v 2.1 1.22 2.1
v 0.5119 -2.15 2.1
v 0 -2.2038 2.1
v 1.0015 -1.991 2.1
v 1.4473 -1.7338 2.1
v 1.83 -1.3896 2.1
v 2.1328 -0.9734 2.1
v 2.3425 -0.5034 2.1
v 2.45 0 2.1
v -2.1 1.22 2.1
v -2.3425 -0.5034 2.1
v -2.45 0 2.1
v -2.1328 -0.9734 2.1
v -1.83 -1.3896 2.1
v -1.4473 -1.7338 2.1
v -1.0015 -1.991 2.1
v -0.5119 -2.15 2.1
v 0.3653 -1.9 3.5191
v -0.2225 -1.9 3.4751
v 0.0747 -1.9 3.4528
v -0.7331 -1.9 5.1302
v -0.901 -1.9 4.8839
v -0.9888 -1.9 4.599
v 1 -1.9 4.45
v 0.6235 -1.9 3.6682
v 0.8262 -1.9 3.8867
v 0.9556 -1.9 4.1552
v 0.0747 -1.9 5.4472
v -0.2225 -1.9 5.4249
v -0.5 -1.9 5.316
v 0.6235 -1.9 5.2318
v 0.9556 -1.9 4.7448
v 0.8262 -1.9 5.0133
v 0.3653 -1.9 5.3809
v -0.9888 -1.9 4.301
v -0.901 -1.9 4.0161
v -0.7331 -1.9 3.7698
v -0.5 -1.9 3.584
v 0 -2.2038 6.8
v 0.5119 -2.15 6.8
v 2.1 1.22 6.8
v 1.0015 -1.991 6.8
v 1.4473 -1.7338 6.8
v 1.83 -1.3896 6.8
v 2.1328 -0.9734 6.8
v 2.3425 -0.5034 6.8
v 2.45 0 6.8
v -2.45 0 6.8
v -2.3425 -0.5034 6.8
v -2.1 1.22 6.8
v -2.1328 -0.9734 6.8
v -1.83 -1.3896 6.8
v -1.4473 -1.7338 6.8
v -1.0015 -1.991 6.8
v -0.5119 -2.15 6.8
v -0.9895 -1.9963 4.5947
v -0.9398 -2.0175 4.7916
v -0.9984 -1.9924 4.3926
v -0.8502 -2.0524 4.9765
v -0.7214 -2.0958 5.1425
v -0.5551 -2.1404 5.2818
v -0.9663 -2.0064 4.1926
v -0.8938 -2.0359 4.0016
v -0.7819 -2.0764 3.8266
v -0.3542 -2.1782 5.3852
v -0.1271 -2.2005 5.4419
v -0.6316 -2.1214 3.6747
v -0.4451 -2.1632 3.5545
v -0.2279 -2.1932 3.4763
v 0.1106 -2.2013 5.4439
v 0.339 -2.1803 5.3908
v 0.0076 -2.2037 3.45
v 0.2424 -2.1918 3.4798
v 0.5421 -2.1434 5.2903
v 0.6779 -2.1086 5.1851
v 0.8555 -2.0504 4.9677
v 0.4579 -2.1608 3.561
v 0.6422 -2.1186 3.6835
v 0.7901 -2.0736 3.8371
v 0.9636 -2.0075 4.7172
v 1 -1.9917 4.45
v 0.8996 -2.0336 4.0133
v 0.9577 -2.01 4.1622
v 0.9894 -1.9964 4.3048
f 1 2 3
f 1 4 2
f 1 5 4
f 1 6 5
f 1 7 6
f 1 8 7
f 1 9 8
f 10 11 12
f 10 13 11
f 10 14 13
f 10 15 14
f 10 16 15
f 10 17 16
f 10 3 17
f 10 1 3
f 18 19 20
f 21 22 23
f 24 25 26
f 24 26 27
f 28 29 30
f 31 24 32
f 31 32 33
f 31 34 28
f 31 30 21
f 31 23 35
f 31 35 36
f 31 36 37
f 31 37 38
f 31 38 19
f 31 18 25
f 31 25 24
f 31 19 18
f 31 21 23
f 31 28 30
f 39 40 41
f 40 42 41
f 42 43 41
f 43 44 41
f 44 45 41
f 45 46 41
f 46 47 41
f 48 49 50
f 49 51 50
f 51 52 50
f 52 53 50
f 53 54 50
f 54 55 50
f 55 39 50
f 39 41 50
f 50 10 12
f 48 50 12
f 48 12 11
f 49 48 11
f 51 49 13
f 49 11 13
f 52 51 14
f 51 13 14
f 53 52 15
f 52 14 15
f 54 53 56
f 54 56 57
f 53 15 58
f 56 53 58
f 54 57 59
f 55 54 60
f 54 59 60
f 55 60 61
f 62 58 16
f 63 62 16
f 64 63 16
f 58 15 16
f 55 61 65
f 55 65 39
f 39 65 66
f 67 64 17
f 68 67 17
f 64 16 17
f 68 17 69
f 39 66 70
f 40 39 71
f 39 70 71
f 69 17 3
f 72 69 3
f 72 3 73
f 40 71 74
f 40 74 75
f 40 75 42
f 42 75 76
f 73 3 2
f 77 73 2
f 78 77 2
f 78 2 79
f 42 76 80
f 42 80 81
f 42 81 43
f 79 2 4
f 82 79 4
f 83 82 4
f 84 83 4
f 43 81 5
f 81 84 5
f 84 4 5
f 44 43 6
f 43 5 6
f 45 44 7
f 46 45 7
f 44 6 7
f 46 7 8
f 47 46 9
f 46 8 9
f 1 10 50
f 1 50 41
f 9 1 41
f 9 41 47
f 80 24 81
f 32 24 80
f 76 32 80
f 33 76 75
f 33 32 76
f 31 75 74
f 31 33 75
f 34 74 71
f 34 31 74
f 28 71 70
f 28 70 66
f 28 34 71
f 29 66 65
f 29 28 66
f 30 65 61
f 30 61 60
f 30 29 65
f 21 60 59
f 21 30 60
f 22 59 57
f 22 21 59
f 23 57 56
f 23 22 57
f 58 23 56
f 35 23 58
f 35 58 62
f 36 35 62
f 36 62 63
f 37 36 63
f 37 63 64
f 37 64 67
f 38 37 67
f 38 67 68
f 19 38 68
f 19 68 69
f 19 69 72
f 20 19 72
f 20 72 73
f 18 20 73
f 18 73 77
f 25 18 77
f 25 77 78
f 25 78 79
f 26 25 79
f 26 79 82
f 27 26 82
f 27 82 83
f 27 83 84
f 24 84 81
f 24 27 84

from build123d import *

# Parameters (mm, degrees)
CYLINDER039_R     = 1
CYLINDER039_DEPTH = 1
EXTRUDE010_DEPTH  = 4.7


with BuildPart() as cylinder039:
    # Cylinder039 → Cylinder039 (new body)
    with BuildSketch(Plane(origin=(0, -1.9, 2.35), x_dir=(1, 0, 0), z_dir=(0, -1, 0))):
        Circle(CYLINDER039_R)
    extrude(amount=CYLINDER039_DEPTH)


with BuildPart() as vt1_body:
    # Sketch027 → Extrude010 (new body)
    with BuildSketch(Plane.XY):
        with BuildLine():
            Line((-2.1, 1.22), (2.1, 1.22))
            Line((2.1, 1.22), (2.45, 0))
            ThreePointArc((-2.45, 0), (0, -2.203757), (2.45, 0))
            Line((-2.1, 1.22), (-2.45, 0))
        make_face()
    extrude(amount=EXTRUDE010_DEPTH)

    # Cut007: cut Cylinder039
    add(cylinder039.part, mode=Mode.SUBTRACT)


with BuildPart() as vt1_body_1:
    # Cut007 placement: moved
    add(vt1_body.part.moved(Location((0, 0, 2.1))))


solid = vt1_body_1.part
